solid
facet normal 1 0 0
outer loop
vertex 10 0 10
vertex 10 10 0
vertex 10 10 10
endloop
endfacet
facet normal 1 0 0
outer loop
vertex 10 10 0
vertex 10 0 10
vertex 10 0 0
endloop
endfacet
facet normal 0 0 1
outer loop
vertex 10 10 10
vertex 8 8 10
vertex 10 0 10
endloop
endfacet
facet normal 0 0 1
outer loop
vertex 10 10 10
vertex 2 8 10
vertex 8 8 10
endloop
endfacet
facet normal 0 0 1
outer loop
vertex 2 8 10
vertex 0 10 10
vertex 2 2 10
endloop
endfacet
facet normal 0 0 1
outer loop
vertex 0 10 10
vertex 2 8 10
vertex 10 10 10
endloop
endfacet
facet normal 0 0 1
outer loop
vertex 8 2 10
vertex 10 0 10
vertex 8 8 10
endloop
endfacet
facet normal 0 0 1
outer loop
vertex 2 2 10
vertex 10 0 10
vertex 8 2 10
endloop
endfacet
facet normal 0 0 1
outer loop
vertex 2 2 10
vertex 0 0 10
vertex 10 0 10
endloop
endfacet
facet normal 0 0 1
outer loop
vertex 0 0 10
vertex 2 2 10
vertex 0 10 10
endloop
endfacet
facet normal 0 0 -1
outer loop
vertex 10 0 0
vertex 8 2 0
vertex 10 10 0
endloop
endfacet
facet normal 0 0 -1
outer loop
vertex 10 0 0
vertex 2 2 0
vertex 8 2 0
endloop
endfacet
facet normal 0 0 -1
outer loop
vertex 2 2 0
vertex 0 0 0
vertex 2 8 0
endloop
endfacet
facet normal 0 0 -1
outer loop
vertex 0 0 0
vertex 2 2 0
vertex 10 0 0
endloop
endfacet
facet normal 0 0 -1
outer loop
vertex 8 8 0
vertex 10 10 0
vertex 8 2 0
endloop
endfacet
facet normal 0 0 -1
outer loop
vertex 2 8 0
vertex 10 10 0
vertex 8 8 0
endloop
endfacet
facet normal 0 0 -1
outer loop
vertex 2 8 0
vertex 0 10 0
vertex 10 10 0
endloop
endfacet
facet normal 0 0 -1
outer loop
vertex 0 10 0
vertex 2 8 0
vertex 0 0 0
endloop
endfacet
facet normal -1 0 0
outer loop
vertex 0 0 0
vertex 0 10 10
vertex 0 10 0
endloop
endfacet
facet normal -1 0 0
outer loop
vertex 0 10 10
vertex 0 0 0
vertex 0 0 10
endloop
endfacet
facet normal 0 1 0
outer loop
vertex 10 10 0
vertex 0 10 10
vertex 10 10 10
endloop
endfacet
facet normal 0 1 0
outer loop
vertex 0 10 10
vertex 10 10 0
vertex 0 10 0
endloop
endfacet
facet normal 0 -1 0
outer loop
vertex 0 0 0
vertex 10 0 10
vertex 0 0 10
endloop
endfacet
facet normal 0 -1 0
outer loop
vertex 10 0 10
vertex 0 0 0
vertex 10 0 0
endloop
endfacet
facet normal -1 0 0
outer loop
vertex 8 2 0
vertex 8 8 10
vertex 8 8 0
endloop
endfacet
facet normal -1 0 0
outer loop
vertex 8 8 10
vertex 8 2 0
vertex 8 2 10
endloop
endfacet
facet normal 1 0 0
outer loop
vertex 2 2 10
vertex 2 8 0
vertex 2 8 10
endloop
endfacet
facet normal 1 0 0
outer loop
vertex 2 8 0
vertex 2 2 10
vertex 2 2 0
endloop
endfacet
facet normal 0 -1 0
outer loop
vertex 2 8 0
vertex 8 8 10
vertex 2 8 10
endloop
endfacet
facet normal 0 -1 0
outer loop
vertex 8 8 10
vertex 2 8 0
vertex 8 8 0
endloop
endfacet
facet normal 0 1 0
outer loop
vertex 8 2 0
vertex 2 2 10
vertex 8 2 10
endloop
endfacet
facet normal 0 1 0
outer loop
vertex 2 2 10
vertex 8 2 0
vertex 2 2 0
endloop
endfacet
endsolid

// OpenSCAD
difference() {
    cube(10);
    translate([2,2,-1]) cube([6,6,12]);
}
